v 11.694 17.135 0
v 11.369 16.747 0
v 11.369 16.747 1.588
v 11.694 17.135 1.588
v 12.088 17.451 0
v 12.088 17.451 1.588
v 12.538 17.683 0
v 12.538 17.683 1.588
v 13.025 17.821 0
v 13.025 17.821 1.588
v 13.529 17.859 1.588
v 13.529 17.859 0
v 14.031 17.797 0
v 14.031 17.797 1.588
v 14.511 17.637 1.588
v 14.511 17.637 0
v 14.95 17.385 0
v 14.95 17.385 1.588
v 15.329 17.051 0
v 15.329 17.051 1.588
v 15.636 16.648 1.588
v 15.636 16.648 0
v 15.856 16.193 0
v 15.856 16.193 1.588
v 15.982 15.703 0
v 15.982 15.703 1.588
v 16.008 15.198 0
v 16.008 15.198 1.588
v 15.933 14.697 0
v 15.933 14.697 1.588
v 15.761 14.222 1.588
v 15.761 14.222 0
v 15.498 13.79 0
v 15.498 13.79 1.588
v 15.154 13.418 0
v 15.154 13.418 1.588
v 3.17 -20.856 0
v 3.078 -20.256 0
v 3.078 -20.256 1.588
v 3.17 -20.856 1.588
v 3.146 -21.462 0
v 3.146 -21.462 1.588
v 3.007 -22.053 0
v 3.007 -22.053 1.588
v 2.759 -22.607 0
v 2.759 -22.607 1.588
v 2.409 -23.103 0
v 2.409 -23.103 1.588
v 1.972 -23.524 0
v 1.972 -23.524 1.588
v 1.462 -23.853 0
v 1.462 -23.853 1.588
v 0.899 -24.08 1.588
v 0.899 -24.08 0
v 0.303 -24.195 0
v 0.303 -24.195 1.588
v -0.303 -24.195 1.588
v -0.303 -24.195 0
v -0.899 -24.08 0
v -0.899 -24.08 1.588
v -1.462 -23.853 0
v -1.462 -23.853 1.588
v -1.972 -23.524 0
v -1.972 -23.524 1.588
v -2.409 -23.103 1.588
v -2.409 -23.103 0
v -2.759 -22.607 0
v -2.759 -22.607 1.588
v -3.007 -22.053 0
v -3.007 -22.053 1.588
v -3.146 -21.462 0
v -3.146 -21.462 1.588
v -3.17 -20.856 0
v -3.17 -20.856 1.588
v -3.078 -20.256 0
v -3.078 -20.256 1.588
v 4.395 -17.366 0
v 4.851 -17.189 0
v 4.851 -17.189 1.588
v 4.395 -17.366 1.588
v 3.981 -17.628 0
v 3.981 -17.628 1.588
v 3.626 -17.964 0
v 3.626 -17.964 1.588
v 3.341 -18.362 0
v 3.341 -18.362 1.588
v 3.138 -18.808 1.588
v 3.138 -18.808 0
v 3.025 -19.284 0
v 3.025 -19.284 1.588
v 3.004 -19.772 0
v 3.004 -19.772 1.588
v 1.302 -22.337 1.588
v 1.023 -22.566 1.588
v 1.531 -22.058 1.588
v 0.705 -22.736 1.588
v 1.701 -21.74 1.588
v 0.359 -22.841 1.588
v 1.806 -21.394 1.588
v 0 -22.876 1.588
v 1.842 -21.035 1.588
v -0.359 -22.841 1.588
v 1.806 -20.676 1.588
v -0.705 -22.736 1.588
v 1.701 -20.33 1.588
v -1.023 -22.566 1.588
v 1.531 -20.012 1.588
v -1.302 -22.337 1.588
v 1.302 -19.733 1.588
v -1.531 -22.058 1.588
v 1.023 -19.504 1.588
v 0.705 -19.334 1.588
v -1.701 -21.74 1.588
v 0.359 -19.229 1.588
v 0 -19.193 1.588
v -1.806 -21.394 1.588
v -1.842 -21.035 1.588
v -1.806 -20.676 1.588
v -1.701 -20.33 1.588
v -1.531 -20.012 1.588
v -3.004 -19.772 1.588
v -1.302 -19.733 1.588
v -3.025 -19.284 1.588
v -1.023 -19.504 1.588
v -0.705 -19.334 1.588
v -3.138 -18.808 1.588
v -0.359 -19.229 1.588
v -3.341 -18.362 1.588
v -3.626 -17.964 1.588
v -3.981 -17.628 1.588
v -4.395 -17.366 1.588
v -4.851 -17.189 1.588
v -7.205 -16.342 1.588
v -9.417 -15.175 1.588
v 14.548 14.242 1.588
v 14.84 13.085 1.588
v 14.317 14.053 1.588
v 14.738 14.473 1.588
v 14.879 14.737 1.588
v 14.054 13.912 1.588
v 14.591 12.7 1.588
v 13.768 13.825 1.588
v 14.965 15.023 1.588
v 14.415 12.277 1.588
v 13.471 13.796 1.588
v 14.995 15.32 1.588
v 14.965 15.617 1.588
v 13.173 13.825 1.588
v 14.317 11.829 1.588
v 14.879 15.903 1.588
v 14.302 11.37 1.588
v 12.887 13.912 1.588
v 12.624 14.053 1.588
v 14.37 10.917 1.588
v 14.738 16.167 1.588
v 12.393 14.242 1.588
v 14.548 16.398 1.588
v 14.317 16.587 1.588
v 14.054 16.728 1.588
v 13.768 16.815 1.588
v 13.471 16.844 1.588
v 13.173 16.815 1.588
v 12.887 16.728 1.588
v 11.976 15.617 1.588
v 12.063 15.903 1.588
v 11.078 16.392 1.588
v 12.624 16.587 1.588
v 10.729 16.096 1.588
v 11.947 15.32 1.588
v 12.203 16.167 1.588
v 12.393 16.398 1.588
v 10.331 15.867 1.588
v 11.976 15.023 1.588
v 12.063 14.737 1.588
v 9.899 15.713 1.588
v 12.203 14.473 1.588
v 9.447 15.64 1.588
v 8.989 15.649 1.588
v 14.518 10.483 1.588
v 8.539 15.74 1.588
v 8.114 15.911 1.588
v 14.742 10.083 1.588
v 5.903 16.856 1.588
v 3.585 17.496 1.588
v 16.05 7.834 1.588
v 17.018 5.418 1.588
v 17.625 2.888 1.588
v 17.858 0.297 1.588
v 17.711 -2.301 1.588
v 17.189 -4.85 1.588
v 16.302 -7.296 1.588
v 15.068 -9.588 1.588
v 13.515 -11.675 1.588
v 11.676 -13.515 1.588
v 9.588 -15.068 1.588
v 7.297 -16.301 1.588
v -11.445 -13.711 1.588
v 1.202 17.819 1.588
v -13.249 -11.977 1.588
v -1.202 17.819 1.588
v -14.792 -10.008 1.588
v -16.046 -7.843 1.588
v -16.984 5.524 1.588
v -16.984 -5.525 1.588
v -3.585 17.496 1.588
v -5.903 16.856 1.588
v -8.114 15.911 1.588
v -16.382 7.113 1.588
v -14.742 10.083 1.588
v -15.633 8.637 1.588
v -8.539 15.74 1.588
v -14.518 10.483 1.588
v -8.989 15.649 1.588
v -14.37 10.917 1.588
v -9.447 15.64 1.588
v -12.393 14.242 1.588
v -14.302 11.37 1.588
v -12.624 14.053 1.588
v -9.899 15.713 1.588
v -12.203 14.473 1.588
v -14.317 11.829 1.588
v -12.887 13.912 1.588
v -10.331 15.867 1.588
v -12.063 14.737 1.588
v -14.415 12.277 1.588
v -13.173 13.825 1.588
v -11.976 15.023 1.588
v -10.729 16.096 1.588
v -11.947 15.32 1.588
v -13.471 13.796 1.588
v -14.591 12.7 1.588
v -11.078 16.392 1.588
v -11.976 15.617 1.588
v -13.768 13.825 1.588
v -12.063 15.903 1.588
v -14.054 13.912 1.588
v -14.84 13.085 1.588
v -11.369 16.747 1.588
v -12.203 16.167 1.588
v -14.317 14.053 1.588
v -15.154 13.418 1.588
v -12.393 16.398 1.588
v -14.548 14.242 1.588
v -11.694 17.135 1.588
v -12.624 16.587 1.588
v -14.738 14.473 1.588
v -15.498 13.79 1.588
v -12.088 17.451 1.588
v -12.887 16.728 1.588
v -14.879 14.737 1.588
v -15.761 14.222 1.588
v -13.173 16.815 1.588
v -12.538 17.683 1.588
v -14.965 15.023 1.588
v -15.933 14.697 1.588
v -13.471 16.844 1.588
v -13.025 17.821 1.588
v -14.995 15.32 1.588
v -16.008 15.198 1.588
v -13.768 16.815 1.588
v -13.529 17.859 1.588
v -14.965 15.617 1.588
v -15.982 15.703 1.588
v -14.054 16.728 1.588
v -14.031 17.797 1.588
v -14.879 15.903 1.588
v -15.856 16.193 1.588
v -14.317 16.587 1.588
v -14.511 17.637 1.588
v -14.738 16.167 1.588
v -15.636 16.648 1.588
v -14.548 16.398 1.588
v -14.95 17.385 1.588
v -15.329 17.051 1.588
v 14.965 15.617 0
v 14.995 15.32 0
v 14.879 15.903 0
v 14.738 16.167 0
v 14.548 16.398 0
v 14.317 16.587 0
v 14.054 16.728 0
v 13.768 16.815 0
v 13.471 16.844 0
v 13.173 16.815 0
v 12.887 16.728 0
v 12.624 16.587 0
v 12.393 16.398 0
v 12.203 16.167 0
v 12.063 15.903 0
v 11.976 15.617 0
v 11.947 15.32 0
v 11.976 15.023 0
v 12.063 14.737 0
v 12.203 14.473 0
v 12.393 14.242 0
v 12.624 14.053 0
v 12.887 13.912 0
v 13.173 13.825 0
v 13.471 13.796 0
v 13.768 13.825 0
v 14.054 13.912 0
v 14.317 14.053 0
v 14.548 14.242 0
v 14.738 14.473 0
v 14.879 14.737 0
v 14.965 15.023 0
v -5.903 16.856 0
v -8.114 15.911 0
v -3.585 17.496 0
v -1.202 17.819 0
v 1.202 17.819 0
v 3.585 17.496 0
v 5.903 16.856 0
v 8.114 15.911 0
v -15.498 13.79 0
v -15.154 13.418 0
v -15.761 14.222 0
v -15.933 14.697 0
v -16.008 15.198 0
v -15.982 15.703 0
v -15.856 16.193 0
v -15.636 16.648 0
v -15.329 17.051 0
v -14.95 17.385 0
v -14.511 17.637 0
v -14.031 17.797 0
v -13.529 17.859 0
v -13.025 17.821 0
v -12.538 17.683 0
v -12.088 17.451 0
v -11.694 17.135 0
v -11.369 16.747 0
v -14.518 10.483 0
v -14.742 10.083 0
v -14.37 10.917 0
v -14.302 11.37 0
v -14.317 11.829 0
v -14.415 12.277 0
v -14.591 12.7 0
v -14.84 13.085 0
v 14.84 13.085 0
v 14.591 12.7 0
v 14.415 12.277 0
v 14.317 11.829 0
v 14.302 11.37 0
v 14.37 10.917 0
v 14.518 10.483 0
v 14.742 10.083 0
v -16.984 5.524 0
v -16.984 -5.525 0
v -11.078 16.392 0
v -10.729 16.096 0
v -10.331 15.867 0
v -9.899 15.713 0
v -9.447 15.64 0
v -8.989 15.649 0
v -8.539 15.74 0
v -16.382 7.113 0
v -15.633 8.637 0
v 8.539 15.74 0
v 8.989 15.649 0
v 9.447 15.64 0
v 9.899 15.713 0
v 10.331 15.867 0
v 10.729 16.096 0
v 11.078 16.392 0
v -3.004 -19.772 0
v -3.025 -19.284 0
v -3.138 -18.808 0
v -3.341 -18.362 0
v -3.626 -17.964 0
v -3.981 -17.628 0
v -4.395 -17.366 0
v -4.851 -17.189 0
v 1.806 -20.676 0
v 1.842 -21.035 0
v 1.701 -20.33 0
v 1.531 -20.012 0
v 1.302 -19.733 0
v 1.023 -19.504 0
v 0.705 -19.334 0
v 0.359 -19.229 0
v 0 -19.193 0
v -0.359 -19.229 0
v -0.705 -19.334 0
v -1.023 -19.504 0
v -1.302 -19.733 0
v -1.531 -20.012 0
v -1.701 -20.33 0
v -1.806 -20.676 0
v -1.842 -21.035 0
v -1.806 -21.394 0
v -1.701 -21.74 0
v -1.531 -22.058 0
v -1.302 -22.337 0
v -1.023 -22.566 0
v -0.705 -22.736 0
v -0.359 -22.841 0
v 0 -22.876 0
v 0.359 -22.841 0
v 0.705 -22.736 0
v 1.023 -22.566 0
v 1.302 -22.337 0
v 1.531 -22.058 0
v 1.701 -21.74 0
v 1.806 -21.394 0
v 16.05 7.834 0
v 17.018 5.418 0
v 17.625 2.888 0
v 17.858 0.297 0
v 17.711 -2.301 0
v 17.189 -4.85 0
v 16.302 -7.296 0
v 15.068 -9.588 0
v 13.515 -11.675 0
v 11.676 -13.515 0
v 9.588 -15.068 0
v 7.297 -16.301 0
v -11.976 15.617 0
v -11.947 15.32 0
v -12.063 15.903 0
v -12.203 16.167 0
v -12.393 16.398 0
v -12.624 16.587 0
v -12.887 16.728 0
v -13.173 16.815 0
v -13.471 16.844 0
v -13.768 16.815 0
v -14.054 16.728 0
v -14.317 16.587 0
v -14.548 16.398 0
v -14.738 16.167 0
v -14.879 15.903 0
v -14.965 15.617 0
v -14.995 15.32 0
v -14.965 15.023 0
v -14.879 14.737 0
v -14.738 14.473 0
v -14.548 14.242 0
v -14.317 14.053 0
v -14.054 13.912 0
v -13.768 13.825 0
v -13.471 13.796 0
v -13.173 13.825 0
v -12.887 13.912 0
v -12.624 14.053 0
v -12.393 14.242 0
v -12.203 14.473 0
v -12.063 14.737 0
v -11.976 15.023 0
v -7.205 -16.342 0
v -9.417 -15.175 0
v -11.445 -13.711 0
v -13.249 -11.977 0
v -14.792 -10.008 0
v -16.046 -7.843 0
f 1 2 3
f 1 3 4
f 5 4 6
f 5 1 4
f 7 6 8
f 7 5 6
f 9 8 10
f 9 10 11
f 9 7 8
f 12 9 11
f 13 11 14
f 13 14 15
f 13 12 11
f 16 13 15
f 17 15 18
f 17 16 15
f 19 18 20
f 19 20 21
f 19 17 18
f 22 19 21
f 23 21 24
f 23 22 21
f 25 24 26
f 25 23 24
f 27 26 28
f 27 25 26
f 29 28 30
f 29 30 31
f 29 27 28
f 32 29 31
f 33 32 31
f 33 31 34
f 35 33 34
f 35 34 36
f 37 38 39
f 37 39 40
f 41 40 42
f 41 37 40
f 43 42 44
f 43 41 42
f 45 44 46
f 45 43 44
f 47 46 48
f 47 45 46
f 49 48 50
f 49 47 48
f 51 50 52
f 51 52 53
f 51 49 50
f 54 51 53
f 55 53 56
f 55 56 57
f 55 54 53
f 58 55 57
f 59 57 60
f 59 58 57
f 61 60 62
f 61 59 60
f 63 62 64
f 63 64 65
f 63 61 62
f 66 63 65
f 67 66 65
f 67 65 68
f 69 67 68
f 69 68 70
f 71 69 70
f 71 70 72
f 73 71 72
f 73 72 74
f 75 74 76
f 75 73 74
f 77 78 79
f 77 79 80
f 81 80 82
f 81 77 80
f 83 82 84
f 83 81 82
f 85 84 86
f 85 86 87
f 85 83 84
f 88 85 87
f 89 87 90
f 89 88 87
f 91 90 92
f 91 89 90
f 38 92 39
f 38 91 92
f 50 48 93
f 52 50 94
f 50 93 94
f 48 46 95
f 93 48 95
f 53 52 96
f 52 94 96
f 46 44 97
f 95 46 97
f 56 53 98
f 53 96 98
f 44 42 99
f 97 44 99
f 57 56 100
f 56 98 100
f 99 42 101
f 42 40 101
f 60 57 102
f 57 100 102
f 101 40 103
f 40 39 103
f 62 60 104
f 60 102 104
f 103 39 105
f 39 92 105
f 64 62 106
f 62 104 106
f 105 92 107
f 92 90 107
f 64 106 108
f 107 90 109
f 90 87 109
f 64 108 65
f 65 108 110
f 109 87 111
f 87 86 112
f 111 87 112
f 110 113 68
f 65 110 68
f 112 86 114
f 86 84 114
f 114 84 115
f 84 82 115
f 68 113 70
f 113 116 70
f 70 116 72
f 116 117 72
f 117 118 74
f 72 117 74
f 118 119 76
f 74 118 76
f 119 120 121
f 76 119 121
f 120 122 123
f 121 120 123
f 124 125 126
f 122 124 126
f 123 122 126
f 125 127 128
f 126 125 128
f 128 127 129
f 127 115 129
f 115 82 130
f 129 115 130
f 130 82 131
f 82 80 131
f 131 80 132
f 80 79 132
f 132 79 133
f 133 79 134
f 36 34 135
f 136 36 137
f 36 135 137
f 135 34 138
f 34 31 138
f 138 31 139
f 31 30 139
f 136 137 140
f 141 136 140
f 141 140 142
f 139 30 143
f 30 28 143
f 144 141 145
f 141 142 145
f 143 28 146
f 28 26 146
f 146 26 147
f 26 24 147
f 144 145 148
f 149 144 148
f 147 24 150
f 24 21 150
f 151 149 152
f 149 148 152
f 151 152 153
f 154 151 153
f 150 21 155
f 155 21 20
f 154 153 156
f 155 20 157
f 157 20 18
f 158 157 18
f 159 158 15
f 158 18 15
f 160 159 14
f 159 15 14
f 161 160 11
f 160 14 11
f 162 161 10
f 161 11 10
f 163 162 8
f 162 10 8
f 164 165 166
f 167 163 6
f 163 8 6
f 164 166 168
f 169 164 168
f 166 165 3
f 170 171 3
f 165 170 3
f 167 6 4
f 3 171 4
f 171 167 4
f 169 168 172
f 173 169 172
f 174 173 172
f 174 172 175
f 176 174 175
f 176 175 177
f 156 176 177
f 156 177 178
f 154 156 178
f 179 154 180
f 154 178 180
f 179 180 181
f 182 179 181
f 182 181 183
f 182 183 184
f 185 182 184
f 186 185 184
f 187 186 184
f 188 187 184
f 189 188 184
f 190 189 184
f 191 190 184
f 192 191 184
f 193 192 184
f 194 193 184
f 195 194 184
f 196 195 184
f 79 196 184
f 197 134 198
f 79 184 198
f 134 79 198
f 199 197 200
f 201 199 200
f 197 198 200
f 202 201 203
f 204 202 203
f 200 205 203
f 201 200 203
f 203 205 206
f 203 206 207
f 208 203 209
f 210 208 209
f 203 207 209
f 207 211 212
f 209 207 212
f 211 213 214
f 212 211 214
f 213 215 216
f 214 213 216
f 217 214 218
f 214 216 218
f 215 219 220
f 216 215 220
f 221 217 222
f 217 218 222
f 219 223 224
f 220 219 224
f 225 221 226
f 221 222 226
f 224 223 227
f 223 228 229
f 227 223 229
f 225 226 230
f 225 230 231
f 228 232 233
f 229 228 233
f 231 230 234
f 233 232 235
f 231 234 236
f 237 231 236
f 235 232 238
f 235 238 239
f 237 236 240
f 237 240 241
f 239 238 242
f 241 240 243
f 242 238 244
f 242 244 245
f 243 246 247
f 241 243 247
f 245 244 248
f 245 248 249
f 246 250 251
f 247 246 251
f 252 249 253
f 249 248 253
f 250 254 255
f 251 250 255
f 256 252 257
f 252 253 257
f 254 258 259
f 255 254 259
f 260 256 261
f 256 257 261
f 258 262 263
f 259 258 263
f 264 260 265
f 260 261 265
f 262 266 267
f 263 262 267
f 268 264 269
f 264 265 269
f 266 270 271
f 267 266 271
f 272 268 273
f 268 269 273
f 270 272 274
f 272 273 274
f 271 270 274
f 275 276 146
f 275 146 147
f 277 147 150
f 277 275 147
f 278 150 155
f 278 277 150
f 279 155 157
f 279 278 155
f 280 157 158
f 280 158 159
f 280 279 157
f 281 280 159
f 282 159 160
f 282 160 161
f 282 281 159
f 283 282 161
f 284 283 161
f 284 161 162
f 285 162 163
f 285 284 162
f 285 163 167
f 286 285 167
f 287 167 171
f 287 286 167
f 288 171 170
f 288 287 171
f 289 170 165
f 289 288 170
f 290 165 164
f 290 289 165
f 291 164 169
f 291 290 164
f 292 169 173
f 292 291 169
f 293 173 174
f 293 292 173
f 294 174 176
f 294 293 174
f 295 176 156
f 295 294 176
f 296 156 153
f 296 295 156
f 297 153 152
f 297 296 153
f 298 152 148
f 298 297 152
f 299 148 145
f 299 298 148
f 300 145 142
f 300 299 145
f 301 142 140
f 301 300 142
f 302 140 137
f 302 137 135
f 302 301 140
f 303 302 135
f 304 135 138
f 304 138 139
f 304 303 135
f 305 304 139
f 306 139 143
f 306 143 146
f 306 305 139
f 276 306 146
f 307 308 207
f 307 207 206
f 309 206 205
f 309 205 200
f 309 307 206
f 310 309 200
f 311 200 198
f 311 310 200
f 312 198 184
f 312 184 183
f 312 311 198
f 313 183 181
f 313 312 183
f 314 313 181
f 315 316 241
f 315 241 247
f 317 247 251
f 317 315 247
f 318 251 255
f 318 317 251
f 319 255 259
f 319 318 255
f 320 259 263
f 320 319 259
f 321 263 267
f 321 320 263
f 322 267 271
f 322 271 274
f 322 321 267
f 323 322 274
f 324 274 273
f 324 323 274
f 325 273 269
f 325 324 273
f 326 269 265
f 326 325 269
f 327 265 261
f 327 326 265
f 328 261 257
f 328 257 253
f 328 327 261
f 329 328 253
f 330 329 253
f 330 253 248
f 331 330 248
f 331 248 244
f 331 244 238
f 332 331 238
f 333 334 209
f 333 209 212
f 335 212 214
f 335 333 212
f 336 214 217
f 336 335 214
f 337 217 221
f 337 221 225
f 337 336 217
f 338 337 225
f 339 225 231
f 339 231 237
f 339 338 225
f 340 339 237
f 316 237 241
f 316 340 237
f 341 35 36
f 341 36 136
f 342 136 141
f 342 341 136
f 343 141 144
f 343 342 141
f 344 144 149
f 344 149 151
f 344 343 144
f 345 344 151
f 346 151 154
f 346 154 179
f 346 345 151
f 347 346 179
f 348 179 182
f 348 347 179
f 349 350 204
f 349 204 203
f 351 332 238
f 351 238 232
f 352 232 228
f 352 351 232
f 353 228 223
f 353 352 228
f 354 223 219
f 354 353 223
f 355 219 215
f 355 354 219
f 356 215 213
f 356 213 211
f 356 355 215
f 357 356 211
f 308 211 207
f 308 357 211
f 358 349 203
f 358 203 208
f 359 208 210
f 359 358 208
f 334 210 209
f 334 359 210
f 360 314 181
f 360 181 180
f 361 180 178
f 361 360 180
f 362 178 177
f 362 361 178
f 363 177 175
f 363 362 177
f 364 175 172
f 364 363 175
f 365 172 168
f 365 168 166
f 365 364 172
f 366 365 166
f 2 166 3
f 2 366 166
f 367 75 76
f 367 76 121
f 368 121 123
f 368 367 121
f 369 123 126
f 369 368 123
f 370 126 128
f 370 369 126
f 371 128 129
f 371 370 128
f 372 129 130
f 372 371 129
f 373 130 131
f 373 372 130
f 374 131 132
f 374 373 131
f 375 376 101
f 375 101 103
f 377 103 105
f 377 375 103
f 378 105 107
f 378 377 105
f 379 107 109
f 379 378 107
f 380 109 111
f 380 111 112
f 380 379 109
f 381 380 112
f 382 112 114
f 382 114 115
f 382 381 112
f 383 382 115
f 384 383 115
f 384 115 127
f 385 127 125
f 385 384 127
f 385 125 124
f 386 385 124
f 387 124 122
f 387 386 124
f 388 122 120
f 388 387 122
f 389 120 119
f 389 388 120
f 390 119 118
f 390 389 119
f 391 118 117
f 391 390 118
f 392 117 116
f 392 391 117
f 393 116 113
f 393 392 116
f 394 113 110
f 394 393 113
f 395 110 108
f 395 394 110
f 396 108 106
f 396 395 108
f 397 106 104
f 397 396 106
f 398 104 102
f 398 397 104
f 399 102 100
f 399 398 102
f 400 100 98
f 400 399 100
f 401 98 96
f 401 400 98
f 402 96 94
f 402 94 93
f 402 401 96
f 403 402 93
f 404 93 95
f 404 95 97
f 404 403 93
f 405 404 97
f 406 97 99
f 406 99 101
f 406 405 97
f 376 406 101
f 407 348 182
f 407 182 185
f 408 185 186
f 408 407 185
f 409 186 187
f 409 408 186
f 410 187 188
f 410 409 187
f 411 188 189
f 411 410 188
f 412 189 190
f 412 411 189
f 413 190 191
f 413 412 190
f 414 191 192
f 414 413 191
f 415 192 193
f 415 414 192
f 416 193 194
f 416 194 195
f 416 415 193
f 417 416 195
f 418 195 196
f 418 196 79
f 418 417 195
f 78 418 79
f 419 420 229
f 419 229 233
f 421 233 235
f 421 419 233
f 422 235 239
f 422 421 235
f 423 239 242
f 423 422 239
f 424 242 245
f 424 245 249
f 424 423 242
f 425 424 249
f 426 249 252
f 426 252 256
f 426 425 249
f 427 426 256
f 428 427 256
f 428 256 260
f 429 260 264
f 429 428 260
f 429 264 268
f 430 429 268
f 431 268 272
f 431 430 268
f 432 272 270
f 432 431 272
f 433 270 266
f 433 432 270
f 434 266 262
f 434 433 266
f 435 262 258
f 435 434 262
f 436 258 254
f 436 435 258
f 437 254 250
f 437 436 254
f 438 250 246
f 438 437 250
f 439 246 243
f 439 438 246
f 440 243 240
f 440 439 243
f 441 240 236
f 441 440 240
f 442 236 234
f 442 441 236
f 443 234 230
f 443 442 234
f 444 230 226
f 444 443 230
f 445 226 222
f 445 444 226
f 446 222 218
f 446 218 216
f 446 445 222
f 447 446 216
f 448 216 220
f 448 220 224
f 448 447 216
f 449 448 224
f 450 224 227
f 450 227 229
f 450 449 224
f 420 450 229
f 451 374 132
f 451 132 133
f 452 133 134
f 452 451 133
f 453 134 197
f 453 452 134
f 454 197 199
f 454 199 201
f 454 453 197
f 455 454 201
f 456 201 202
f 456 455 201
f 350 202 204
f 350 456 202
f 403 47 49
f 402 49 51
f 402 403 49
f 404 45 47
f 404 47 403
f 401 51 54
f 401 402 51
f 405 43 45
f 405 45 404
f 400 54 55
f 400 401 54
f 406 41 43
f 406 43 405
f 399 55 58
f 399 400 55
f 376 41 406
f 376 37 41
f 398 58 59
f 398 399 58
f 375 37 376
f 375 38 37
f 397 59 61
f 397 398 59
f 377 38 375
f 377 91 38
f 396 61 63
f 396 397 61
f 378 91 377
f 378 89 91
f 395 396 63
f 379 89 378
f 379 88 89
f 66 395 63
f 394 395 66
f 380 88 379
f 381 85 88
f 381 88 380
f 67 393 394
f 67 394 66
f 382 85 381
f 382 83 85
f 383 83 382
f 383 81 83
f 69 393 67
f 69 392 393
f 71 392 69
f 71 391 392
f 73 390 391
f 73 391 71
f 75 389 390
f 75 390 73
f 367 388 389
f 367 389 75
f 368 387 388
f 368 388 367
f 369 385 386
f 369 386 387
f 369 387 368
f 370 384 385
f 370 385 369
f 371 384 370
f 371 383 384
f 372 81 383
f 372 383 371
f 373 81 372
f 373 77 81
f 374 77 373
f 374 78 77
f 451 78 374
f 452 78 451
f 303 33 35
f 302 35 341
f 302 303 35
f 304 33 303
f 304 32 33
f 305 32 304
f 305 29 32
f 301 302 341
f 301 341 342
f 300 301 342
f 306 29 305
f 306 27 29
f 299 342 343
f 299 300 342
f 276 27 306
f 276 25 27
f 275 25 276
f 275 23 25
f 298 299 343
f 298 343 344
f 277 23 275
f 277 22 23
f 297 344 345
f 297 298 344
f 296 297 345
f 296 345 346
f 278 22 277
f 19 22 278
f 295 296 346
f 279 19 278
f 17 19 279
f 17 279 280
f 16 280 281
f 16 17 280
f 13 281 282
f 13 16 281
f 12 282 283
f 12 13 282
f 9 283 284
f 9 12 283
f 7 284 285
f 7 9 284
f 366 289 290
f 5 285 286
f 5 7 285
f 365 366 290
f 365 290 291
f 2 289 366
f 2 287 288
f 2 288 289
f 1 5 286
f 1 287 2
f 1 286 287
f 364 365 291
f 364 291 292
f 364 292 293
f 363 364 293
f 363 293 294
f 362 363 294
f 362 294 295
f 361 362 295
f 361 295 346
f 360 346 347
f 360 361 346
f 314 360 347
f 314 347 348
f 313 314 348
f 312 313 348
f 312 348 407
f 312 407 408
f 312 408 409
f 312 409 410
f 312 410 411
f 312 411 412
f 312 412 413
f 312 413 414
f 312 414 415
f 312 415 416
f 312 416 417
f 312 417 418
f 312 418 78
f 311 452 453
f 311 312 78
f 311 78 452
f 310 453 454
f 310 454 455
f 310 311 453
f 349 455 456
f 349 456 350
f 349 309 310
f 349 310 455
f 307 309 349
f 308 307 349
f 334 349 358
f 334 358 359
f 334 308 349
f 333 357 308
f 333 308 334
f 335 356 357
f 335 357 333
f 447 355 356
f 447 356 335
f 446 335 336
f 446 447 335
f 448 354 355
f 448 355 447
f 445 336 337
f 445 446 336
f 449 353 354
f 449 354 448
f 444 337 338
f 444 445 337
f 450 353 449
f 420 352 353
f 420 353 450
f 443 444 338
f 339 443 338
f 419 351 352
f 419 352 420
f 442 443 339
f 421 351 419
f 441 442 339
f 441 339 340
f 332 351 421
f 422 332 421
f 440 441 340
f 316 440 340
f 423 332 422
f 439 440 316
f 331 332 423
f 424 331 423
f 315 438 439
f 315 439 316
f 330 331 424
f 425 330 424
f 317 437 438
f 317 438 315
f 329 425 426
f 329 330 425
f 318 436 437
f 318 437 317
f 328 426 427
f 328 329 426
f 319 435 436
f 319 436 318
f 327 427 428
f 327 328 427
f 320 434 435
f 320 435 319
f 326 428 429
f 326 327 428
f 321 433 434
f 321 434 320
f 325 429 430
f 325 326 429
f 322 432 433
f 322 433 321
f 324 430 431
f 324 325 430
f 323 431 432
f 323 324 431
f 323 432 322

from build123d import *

# Parameters (mm, degrees)
SKETCH1_R           = 1.8415
SKETCH1_R_2         = 1.524
BOSS_EXTRUDE1_DEPTH = 1.5875


with BuildPart() as part:
    # Sketch1 → Boss-Extrude1 (new body)
    with BuildSketch(Plane.XY):
        with BuildLine():
            Line((-16.984058744, -5.5245), (-16.984058744, 5.5245))
            ThreePointArc((-16.984058744, 5.5245), (-16.025769731, 7.883720963), (-14.741706386, 10.082680423))
            ThreePointArc((-14.741706386, 10.082680423), (-14.317457481, 11.828509895), (-15.154421031, 13.418289658))
            ThreePointArc((-15.154421031, 13.418289658), (-15.147832175, 17.227454165), (-11.369129629, 16.746637442))
            ThreePointArc((-11.369129629, 16.746637442), (-9.89949783, 15.713153019), (-8.113736976, 15.910550712))
            ThreePointArc((-8.113736976, 15.910550712), (0, 17.859965052), (8.113736976, 15.910550712))
            ThreePointArc((8.113736976, 15.910550712), (9.89949783, 15.713153019), (11.369129629, 16.746637442))
            ThreePointArc((11.369129629, 16.746637442), (15.147832175, 17.227454165), (15.154421031, 13.418289658))
            ThreePointArc((15.154421031, 13.418289658), (14.317457481, 11.828509895), (14.741706386, 10.082680423))
            ThreePointArc((14.741706386, 10.082680423), (16.789759308, -6.089526588), (4.850582957, -17.188664772))
            ThreePointArc((4.850582957, -17.188664772), (3.34119056, -18.362373067), (3.078011585, -20.256203417))
            ThreePointArc((3.078011585, -20.256203417), (0, -24.209965052), (-3.078011585, -20.256203417))
            ThreePointArc((-3.078011585, -20.256203417), (-3.34119056, -18.362373067), (-4.850582957, -17.188664772))
            ThreePointArc((-4.850582957, -17.188664772), (-12.377442365, -12.875452309), (-16.984058744, -5.5245))
        make_face()
        with Locations((0, -21.034965052)):
            Circle(SKETCH1_R, mode=Mode.SUBTRACT)
        with Locations((-13.470606702, 15.319965052)):
            Circle(SKETCH1_R_2, mode=Mode.SUBTRACT)
        with Locations((13.470606702, 15.319965052)):
            Circle(SKETCH1_R_2, mode=Mode.SUBTRACT)
    extrude(amount=BOSS_EXTRUDE1_DEPTH)


solid = part.part
